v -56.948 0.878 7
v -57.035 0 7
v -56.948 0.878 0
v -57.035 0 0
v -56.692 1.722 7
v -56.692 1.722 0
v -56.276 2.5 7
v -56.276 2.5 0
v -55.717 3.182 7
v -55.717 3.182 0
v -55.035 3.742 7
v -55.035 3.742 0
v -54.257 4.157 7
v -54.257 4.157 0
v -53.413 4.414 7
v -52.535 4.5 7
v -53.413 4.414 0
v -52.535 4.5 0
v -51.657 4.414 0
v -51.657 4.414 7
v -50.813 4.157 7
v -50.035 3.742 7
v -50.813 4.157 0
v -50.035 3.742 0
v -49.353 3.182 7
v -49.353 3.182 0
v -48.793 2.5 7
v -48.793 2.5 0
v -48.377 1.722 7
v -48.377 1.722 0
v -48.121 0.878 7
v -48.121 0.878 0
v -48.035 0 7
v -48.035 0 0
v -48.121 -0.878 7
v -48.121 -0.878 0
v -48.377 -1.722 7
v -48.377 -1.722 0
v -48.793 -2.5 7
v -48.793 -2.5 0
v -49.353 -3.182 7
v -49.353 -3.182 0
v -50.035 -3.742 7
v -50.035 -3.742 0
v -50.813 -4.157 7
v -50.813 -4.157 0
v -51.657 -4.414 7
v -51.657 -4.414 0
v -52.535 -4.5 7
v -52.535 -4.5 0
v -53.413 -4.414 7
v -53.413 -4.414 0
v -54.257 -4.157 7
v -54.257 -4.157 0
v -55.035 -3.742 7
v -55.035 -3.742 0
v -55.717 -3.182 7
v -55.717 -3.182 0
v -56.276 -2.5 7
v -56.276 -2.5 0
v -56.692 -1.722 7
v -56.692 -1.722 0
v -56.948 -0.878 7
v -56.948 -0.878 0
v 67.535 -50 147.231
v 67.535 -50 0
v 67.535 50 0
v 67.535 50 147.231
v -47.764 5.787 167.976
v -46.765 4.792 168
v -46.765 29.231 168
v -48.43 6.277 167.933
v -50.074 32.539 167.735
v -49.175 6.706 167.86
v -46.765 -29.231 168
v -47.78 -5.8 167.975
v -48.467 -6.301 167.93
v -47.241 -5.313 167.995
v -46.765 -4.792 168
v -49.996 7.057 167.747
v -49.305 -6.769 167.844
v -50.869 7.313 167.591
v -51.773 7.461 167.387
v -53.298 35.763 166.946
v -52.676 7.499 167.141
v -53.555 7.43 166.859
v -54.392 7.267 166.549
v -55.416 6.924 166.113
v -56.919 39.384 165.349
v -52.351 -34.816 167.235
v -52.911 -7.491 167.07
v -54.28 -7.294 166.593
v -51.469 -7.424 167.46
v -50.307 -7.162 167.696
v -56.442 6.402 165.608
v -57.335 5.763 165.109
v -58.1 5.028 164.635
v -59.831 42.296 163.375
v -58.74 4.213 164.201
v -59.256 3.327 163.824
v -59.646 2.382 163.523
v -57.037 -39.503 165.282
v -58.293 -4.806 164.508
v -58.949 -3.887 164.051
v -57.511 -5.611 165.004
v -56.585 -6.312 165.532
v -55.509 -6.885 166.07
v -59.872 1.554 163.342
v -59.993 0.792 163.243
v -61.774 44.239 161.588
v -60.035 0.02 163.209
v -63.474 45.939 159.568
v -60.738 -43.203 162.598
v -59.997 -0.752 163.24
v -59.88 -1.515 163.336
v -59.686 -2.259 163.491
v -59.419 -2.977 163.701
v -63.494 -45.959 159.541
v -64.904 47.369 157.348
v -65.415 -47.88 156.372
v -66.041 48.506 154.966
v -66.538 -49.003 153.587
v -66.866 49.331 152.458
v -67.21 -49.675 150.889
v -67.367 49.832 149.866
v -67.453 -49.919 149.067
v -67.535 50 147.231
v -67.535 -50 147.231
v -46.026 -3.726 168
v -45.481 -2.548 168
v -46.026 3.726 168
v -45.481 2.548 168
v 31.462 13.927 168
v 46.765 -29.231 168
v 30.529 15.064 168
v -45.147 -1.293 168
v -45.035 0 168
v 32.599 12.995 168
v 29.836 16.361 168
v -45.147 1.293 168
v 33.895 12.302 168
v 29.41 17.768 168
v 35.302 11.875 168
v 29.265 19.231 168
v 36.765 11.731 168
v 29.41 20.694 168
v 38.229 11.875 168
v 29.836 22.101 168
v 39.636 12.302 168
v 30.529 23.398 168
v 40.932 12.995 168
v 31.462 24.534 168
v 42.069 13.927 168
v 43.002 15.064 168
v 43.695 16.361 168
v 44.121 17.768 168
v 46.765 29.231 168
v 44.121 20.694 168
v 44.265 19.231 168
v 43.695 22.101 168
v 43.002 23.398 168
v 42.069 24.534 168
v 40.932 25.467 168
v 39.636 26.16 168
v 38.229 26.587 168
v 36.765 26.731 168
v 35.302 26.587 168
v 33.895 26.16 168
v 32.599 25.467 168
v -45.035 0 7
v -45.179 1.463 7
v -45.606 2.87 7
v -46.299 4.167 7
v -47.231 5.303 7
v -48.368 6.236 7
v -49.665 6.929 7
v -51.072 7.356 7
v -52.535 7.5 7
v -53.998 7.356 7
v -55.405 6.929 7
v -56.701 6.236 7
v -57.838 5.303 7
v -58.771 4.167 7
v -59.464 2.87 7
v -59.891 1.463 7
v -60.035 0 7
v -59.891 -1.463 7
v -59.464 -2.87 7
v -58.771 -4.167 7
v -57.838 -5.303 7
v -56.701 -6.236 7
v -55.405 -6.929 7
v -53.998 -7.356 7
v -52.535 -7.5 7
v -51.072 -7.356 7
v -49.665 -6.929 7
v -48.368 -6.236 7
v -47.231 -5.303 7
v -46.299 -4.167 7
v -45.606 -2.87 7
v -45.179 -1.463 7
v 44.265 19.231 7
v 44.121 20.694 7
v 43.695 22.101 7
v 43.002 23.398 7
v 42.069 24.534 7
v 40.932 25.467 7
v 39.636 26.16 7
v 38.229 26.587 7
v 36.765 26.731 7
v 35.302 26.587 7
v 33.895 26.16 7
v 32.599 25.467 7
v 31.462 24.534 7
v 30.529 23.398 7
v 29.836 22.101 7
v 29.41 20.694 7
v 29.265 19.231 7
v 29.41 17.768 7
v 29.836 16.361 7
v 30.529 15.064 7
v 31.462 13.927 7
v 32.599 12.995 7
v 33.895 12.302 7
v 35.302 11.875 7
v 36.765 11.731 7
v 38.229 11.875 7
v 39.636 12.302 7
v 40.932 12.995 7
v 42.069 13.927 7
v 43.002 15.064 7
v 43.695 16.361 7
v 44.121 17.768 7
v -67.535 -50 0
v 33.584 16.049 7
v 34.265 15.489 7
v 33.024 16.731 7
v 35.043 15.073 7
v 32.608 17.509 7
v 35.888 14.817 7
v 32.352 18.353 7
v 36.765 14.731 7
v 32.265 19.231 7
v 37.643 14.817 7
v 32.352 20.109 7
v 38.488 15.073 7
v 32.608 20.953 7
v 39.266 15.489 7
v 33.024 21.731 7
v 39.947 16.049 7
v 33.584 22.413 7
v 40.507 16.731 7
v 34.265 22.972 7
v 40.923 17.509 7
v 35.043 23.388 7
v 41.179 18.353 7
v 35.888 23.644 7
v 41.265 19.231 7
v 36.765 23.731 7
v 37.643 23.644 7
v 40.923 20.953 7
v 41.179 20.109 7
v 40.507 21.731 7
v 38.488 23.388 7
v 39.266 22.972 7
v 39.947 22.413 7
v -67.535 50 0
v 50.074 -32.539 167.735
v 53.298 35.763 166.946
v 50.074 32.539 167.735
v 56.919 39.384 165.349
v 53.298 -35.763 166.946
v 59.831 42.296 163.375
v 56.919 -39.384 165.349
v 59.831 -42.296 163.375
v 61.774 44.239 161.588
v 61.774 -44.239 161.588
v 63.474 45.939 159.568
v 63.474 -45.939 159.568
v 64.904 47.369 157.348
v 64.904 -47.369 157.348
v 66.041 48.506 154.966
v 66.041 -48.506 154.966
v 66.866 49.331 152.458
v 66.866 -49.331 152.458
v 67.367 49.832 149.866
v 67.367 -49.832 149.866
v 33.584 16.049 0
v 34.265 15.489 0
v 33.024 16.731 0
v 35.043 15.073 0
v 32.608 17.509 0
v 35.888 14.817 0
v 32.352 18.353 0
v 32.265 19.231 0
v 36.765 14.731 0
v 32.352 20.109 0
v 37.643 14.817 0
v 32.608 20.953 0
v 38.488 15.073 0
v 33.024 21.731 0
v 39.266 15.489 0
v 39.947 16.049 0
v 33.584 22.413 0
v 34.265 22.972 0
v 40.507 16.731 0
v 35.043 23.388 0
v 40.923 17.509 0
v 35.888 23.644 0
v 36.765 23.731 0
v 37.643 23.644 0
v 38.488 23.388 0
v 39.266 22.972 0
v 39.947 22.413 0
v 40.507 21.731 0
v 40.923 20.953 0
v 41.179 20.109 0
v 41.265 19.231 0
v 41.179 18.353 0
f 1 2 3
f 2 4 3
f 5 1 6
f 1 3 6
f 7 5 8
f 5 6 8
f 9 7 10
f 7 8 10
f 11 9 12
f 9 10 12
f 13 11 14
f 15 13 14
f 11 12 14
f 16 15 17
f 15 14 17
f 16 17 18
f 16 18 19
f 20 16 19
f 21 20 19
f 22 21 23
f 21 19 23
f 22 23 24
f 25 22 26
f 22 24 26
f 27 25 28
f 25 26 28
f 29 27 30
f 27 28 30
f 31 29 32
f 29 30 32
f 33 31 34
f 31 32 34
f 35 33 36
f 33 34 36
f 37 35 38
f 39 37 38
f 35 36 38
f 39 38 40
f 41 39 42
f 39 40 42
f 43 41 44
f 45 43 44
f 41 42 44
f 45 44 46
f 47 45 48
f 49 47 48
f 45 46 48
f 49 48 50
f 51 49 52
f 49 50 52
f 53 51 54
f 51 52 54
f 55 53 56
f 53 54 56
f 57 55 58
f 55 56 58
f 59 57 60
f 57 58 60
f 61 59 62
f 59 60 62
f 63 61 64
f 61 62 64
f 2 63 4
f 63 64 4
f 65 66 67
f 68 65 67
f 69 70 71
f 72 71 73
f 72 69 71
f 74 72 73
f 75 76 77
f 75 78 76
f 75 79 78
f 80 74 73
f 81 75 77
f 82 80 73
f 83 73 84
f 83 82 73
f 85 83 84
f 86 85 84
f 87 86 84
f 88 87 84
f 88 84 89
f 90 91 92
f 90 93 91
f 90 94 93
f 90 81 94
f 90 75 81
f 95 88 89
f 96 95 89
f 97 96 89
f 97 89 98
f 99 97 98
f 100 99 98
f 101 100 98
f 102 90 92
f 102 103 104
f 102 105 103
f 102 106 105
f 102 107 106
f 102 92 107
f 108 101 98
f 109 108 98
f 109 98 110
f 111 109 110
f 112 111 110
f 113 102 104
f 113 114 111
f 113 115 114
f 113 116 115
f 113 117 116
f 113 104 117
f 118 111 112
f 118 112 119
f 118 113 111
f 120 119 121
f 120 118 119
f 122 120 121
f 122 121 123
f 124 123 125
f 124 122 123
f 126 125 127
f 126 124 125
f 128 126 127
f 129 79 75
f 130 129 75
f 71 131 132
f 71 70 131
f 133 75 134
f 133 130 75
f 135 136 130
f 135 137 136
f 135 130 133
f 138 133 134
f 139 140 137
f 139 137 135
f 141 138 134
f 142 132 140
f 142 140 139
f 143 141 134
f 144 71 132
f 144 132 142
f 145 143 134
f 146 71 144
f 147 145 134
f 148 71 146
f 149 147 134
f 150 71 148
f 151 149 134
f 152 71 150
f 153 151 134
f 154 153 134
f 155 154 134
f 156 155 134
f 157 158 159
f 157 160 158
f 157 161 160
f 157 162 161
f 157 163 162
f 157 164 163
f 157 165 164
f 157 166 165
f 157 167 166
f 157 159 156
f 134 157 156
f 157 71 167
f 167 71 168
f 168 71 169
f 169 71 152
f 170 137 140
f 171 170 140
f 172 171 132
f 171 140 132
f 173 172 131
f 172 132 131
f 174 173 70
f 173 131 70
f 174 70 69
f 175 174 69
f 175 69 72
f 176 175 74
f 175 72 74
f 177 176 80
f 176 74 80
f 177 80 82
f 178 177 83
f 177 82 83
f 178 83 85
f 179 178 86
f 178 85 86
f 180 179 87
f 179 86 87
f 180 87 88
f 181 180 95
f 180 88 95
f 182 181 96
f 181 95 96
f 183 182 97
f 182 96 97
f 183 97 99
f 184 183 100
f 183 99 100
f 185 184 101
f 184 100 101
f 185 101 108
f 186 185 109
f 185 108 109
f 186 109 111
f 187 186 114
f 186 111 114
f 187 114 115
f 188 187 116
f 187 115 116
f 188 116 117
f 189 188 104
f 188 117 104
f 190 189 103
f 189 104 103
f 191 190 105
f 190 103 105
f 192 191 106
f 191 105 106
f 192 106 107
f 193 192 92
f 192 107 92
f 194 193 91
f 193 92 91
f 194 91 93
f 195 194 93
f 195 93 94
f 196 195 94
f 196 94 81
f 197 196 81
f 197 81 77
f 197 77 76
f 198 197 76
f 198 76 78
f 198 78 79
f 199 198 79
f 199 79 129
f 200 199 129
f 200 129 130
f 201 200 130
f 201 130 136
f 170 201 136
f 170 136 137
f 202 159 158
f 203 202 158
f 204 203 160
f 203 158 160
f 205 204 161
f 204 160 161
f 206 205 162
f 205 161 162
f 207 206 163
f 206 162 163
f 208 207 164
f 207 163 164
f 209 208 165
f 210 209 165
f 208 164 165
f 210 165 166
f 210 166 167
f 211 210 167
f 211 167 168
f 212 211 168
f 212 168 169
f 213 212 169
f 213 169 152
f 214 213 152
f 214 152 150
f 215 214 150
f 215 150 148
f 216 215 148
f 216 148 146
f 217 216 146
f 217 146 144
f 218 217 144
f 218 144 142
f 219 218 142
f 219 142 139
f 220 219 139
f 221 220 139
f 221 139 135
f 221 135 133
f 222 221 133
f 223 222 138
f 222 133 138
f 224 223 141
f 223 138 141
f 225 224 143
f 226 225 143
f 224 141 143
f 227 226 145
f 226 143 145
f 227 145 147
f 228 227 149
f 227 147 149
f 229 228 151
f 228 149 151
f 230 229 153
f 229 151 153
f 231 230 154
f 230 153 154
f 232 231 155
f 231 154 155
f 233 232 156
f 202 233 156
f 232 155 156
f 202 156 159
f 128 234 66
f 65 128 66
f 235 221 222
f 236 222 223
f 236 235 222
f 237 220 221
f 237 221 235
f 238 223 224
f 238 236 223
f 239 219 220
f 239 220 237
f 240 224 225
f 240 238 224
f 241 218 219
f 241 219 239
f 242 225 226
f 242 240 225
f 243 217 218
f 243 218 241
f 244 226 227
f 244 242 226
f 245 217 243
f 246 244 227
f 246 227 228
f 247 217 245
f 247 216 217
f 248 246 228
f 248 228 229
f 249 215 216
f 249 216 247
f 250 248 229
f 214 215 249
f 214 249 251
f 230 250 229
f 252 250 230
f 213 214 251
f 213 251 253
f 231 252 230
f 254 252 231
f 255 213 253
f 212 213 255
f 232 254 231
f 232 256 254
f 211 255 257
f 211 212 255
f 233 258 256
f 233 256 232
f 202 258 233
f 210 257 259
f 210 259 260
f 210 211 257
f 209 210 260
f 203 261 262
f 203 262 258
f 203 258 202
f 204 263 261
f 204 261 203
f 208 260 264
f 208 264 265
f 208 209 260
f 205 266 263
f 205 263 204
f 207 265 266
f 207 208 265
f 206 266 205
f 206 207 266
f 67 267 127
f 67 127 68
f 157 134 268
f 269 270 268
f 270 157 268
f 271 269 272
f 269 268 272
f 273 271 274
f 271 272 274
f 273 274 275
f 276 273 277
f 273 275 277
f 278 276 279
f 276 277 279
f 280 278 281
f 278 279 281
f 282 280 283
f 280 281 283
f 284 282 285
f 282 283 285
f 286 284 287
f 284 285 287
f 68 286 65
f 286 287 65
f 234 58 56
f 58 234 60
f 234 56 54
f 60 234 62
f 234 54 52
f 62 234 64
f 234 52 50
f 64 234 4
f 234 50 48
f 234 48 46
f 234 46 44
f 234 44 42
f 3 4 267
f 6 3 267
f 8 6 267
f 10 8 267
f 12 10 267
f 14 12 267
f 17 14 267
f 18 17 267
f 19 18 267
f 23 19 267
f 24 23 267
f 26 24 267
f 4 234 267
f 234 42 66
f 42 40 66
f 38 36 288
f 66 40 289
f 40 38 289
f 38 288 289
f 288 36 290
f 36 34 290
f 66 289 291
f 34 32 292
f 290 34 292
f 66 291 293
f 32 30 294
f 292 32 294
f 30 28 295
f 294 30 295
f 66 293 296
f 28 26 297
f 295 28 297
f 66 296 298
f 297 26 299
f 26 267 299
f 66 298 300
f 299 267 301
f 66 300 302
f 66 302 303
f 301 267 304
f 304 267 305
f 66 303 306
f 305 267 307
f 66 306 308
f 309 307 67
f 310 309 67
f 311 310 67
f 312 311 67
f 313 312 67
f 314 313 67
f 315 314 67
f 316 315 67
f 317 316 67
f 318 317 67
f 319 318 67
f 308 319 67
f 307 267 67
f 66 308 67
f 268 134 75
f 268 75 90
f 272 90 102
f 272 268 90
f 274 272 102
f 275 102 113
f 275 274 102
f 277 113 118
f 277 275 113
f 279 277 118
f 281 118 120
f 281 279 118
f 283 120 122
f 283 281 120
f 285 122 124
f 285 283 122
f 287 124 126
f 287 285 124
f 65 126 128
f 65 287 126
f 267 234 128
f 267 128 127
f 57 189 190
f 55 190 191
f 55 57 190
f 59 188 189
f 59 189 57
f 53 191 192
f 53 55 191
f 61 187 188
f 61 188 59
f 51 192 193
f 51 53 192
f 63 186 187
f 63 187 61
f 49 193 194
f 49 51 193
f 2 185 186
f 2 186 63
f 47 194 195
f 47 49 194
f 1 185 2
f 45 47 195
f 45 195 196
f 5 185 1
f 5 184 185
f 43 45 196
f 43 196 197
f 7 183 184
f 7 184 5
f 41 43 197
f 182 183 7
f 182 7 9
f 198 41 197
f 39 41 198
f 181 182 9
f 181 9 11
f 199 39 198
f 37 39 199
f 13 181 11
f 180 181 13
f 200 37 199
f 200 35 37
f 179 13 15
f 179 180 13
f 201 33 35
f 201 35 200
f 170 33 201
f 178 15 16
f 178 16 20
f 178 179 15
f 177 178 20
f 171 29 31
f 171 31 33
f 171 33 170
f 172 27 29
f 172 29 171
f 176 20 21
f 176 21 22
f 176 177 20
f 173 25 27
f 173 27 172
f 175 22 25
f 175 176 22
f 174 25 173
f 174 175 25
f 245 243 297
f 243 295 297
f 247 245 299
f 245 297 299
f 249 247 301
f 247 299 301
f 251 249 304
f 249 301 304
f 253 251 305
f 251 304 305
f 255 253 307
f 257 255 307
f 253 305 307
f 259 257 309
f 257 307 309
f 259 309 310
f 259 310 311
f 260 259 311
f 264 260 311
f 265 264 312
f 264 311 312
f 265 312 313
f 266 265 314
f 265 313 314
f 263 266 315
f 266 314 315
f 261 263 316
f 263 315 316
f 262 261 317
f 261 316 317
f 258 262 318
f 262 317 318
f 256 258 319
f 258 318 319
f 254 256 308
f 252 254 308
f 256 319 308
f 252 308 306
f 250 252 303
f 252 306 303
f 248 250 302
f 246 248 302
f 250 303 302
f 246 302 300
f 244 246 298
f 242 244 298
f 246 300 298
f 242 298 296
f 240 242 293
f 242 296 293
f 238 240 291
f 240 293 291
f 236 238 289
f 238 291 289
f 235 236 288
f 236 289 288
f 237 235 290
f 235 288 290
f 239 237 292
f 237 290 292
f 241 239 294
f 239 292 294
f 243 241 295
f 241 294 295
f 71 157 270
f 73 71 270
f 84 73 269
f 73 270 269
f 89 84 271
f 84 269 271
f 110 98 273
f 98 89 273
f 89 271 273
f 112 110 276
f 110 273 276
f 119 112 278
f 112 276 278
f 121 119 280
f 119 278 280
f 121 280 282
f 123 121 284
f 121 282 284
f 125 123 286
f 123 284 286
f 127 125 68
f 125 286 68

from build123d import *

# Parameters (mm, degrees)
SKIZZE1_W                                           = 135.069444444
SKIZZE1_H                                           = 100
AUFSATZ_LINEAR_AUSTRAGEN1_DEPTH                     = 168
SCHNITT_LINEAR_AUSTRAGEN1_DEPTH                     = 222.286589794
SCHNITT_LINEAR_AUSTRAGEN2_DEPTH                     = 207.845204696
SPIEGELN2_COPY_1_DEPTH                              = 222.286589794
SPIEGELN2_COPY_2_DEPTH                              = 222.286589794
STIRNSENKUNG_F_R_M8_SENKSCHRAUBE_KOPF_B_D           = 9
STIRNSENKUNG_F_R_M8_SENKSCHRAUBE_KOPF_B_CBORE_D     = 15
STIRNSENKUNG_F_R_M8_SENKSCHRAUBE_KOPF_B_CBORE_DEPTH = 161
STIRNSENKUNG_F_R_M8_SENKSCHRAUBE_KO_2_D             = 9
STIRNSENKUNG_F_R_M8_SENKSCHRAUBE_KO_2_CBORE_D       = 15
STIRNSENKUNG_F_R_M8_SENKSCHRAUBE_KO_2_CBORE_DEPTH   = 161


with BuildPart() as part:
    # Skizze1 → Aufsatz-Linear austragen1 (new body)
    with BuildSketch(Plane.XY):
        Rectangle(SKIZZE1_W, SKIZZE1_H)
    extrude(amount=AUFSATZ_LINEAR_AUSTRAGEN1_DEPTH)

    # Skizze2 → Schnitt-Linear austragen1 (cut, through all)
    with BuildSketch(Plane(origin=(67.534722222, 0, 0), x_dir=(0, 0, -1), z_dir=(1, 0, 0))):
        with BuildLine():
            Line((-147.230769231, 50), (18.556111772, 50))
            Line((18.556111772, 50), (-294.033910821, 102.758784569))
            Line((-294.033910821, 102.758784569), (-168, -33.660289563))
            Line((-168, -33.660289563), (-168, 29.230769231))
            ThreePointArc((-168, 29.230769231), (-161.916833148, 43.916833148), (-147.230769231, 50))
        make_face()
    schnitt_linear_austragen1 = extrude(amount=-SCHNITT_LINEAR_AUSTRAGEN1_DEPTH, mode=Mode.SUBTRACT)

    # Skizze3 → Schnitt-Linear austragen2 (cut, through all)
    with BuildSketch(Plane.XZ.offset(50)):
        with BuildLine():
            Line((67.534722222, 147.230769231), (67.534722222, 12.080316404))
            Line((67.534722222, 12.080316404), (116.298873036, 236.387140366))
            Line((116.298873036, 236.387140366), (-16.125567341, 168))
            Line((-16.125567341, 168), (46.765491453, 168))
            ThreePointArc((46.765491453, 168), (61.45155537, 161.916833148), (67.534722222, 147.230769231))
        make_face()
    schnitt_linear_austragen2 = extrude(amount=-SCHNITT_LINEAR_AUSTRAGEN2_DEPTH, mode=Mode.SUBTRACT)

    # Spiegeln1: Schnitt-Linear austragen1 across plane
    add(schnitt_linear_austragen1.mirror(Plane.ZX), mode=Mode.SUBTRACT)

    # Spiegeln2: Schnitt-Linear austragen2 across plane
    add(schnitt_linear_austragen2.mirror(Plane(origin=(0, 0, 0), x_dir=(0, 0, 1), z_dir=(1, 0, 0))), mode=Mode.SUBTRACT)

    # Spiegeln2 copy 1 sketch → Spiegeln2 copy 1 (cut, through all)
    with BuildSketch(Plane(origin=(-67.534722222, 0, 0), x_dir=(0, 0, -1), z_dir=(-1, 0, 0))):
        with BuildLine():
            Line((-147.230769231, 50), (18.556111772, 50))
            Line((18.556111772, 50), (-294.033910821, 102.758784569))
            Line((-294.033910821, 102.758784569), (-168, -33.660289563))
            Line((-168, -33.660289563), (-168, 29.230769231))
            ThreePointArc((-168, 29.230769231), (-161.916833148, 43.916833148), (-147.230769231, 50))
        make_face()
    extrude(amount=-SPIEGELN2_COPY_1_DEPTH, mode=Mode.SUBTRACT)

    # Spiegeln2 copy 2 sketch → Spiegeln2 copy 2 (cut, through all)
    with BuildSketch(Plane(origin=(-67.534722222, 0, 0), x_dir=(0, 0, -1), z_dir=(-1, 0, 0))):
        with BuildLine():
            Line((-147.230769231, -50), (18.556111772, -50))
            Line((18.556111772, -50), (-294.033910821, -102.758784569))
            Line((-294.033910821, -102.758784569), (-168, 33.660289563))
            Line((-168, 33.660289563), (-168, -29.230769231))
            ThreePointArc((-168, -29.230769231), (-161.916833148, -43.916833148), (-147.230769231, -50))
        make_face()
    extrude(amount=-SPIEGELN2_COPY_2_DEPTH, mode=Mode.SUBTRACT)

    # Stirnsenkung f_r M8 Senkschraube _Kopf B (through all)
    with Locations(Plane.XY.offset(168)):
        with Locations((-52.534722222, 0)):
            CounterBoreHole(STIRNSENKUNG_F_R_M8_SENKSCHRAUBE_KOPF_B_D / 2, STIRNSENKUNG_F_R_M8_SENKSCHRAUBE_KOPF_B_CBORE_D / 2, STIRNSENKUNG_F_R_M8_SENKSCHRAUBE_KOPF_B_CBORE_DEPTH)

    # Stirnsenkung f_r M8 Senkschraube _Ko 2 (through all)
    with Locations(Plane.XY.offset(168)):
        with Locations((36.765491453, 19.230769231)):
            CounterBoreHole(STIRNSENKUNG_F_R_M8_SENKSCHRAUBE_KO_2_D / 2, STIRNSENKUNG_F_R_M8_SENKSCHRAUBE_KO_2_CBORE_D / 2, STIRNSENKUNG_F_R_M8_SENKSCHRAUBE_KO_2_CBORE_DEPTH)


solid = part.part
